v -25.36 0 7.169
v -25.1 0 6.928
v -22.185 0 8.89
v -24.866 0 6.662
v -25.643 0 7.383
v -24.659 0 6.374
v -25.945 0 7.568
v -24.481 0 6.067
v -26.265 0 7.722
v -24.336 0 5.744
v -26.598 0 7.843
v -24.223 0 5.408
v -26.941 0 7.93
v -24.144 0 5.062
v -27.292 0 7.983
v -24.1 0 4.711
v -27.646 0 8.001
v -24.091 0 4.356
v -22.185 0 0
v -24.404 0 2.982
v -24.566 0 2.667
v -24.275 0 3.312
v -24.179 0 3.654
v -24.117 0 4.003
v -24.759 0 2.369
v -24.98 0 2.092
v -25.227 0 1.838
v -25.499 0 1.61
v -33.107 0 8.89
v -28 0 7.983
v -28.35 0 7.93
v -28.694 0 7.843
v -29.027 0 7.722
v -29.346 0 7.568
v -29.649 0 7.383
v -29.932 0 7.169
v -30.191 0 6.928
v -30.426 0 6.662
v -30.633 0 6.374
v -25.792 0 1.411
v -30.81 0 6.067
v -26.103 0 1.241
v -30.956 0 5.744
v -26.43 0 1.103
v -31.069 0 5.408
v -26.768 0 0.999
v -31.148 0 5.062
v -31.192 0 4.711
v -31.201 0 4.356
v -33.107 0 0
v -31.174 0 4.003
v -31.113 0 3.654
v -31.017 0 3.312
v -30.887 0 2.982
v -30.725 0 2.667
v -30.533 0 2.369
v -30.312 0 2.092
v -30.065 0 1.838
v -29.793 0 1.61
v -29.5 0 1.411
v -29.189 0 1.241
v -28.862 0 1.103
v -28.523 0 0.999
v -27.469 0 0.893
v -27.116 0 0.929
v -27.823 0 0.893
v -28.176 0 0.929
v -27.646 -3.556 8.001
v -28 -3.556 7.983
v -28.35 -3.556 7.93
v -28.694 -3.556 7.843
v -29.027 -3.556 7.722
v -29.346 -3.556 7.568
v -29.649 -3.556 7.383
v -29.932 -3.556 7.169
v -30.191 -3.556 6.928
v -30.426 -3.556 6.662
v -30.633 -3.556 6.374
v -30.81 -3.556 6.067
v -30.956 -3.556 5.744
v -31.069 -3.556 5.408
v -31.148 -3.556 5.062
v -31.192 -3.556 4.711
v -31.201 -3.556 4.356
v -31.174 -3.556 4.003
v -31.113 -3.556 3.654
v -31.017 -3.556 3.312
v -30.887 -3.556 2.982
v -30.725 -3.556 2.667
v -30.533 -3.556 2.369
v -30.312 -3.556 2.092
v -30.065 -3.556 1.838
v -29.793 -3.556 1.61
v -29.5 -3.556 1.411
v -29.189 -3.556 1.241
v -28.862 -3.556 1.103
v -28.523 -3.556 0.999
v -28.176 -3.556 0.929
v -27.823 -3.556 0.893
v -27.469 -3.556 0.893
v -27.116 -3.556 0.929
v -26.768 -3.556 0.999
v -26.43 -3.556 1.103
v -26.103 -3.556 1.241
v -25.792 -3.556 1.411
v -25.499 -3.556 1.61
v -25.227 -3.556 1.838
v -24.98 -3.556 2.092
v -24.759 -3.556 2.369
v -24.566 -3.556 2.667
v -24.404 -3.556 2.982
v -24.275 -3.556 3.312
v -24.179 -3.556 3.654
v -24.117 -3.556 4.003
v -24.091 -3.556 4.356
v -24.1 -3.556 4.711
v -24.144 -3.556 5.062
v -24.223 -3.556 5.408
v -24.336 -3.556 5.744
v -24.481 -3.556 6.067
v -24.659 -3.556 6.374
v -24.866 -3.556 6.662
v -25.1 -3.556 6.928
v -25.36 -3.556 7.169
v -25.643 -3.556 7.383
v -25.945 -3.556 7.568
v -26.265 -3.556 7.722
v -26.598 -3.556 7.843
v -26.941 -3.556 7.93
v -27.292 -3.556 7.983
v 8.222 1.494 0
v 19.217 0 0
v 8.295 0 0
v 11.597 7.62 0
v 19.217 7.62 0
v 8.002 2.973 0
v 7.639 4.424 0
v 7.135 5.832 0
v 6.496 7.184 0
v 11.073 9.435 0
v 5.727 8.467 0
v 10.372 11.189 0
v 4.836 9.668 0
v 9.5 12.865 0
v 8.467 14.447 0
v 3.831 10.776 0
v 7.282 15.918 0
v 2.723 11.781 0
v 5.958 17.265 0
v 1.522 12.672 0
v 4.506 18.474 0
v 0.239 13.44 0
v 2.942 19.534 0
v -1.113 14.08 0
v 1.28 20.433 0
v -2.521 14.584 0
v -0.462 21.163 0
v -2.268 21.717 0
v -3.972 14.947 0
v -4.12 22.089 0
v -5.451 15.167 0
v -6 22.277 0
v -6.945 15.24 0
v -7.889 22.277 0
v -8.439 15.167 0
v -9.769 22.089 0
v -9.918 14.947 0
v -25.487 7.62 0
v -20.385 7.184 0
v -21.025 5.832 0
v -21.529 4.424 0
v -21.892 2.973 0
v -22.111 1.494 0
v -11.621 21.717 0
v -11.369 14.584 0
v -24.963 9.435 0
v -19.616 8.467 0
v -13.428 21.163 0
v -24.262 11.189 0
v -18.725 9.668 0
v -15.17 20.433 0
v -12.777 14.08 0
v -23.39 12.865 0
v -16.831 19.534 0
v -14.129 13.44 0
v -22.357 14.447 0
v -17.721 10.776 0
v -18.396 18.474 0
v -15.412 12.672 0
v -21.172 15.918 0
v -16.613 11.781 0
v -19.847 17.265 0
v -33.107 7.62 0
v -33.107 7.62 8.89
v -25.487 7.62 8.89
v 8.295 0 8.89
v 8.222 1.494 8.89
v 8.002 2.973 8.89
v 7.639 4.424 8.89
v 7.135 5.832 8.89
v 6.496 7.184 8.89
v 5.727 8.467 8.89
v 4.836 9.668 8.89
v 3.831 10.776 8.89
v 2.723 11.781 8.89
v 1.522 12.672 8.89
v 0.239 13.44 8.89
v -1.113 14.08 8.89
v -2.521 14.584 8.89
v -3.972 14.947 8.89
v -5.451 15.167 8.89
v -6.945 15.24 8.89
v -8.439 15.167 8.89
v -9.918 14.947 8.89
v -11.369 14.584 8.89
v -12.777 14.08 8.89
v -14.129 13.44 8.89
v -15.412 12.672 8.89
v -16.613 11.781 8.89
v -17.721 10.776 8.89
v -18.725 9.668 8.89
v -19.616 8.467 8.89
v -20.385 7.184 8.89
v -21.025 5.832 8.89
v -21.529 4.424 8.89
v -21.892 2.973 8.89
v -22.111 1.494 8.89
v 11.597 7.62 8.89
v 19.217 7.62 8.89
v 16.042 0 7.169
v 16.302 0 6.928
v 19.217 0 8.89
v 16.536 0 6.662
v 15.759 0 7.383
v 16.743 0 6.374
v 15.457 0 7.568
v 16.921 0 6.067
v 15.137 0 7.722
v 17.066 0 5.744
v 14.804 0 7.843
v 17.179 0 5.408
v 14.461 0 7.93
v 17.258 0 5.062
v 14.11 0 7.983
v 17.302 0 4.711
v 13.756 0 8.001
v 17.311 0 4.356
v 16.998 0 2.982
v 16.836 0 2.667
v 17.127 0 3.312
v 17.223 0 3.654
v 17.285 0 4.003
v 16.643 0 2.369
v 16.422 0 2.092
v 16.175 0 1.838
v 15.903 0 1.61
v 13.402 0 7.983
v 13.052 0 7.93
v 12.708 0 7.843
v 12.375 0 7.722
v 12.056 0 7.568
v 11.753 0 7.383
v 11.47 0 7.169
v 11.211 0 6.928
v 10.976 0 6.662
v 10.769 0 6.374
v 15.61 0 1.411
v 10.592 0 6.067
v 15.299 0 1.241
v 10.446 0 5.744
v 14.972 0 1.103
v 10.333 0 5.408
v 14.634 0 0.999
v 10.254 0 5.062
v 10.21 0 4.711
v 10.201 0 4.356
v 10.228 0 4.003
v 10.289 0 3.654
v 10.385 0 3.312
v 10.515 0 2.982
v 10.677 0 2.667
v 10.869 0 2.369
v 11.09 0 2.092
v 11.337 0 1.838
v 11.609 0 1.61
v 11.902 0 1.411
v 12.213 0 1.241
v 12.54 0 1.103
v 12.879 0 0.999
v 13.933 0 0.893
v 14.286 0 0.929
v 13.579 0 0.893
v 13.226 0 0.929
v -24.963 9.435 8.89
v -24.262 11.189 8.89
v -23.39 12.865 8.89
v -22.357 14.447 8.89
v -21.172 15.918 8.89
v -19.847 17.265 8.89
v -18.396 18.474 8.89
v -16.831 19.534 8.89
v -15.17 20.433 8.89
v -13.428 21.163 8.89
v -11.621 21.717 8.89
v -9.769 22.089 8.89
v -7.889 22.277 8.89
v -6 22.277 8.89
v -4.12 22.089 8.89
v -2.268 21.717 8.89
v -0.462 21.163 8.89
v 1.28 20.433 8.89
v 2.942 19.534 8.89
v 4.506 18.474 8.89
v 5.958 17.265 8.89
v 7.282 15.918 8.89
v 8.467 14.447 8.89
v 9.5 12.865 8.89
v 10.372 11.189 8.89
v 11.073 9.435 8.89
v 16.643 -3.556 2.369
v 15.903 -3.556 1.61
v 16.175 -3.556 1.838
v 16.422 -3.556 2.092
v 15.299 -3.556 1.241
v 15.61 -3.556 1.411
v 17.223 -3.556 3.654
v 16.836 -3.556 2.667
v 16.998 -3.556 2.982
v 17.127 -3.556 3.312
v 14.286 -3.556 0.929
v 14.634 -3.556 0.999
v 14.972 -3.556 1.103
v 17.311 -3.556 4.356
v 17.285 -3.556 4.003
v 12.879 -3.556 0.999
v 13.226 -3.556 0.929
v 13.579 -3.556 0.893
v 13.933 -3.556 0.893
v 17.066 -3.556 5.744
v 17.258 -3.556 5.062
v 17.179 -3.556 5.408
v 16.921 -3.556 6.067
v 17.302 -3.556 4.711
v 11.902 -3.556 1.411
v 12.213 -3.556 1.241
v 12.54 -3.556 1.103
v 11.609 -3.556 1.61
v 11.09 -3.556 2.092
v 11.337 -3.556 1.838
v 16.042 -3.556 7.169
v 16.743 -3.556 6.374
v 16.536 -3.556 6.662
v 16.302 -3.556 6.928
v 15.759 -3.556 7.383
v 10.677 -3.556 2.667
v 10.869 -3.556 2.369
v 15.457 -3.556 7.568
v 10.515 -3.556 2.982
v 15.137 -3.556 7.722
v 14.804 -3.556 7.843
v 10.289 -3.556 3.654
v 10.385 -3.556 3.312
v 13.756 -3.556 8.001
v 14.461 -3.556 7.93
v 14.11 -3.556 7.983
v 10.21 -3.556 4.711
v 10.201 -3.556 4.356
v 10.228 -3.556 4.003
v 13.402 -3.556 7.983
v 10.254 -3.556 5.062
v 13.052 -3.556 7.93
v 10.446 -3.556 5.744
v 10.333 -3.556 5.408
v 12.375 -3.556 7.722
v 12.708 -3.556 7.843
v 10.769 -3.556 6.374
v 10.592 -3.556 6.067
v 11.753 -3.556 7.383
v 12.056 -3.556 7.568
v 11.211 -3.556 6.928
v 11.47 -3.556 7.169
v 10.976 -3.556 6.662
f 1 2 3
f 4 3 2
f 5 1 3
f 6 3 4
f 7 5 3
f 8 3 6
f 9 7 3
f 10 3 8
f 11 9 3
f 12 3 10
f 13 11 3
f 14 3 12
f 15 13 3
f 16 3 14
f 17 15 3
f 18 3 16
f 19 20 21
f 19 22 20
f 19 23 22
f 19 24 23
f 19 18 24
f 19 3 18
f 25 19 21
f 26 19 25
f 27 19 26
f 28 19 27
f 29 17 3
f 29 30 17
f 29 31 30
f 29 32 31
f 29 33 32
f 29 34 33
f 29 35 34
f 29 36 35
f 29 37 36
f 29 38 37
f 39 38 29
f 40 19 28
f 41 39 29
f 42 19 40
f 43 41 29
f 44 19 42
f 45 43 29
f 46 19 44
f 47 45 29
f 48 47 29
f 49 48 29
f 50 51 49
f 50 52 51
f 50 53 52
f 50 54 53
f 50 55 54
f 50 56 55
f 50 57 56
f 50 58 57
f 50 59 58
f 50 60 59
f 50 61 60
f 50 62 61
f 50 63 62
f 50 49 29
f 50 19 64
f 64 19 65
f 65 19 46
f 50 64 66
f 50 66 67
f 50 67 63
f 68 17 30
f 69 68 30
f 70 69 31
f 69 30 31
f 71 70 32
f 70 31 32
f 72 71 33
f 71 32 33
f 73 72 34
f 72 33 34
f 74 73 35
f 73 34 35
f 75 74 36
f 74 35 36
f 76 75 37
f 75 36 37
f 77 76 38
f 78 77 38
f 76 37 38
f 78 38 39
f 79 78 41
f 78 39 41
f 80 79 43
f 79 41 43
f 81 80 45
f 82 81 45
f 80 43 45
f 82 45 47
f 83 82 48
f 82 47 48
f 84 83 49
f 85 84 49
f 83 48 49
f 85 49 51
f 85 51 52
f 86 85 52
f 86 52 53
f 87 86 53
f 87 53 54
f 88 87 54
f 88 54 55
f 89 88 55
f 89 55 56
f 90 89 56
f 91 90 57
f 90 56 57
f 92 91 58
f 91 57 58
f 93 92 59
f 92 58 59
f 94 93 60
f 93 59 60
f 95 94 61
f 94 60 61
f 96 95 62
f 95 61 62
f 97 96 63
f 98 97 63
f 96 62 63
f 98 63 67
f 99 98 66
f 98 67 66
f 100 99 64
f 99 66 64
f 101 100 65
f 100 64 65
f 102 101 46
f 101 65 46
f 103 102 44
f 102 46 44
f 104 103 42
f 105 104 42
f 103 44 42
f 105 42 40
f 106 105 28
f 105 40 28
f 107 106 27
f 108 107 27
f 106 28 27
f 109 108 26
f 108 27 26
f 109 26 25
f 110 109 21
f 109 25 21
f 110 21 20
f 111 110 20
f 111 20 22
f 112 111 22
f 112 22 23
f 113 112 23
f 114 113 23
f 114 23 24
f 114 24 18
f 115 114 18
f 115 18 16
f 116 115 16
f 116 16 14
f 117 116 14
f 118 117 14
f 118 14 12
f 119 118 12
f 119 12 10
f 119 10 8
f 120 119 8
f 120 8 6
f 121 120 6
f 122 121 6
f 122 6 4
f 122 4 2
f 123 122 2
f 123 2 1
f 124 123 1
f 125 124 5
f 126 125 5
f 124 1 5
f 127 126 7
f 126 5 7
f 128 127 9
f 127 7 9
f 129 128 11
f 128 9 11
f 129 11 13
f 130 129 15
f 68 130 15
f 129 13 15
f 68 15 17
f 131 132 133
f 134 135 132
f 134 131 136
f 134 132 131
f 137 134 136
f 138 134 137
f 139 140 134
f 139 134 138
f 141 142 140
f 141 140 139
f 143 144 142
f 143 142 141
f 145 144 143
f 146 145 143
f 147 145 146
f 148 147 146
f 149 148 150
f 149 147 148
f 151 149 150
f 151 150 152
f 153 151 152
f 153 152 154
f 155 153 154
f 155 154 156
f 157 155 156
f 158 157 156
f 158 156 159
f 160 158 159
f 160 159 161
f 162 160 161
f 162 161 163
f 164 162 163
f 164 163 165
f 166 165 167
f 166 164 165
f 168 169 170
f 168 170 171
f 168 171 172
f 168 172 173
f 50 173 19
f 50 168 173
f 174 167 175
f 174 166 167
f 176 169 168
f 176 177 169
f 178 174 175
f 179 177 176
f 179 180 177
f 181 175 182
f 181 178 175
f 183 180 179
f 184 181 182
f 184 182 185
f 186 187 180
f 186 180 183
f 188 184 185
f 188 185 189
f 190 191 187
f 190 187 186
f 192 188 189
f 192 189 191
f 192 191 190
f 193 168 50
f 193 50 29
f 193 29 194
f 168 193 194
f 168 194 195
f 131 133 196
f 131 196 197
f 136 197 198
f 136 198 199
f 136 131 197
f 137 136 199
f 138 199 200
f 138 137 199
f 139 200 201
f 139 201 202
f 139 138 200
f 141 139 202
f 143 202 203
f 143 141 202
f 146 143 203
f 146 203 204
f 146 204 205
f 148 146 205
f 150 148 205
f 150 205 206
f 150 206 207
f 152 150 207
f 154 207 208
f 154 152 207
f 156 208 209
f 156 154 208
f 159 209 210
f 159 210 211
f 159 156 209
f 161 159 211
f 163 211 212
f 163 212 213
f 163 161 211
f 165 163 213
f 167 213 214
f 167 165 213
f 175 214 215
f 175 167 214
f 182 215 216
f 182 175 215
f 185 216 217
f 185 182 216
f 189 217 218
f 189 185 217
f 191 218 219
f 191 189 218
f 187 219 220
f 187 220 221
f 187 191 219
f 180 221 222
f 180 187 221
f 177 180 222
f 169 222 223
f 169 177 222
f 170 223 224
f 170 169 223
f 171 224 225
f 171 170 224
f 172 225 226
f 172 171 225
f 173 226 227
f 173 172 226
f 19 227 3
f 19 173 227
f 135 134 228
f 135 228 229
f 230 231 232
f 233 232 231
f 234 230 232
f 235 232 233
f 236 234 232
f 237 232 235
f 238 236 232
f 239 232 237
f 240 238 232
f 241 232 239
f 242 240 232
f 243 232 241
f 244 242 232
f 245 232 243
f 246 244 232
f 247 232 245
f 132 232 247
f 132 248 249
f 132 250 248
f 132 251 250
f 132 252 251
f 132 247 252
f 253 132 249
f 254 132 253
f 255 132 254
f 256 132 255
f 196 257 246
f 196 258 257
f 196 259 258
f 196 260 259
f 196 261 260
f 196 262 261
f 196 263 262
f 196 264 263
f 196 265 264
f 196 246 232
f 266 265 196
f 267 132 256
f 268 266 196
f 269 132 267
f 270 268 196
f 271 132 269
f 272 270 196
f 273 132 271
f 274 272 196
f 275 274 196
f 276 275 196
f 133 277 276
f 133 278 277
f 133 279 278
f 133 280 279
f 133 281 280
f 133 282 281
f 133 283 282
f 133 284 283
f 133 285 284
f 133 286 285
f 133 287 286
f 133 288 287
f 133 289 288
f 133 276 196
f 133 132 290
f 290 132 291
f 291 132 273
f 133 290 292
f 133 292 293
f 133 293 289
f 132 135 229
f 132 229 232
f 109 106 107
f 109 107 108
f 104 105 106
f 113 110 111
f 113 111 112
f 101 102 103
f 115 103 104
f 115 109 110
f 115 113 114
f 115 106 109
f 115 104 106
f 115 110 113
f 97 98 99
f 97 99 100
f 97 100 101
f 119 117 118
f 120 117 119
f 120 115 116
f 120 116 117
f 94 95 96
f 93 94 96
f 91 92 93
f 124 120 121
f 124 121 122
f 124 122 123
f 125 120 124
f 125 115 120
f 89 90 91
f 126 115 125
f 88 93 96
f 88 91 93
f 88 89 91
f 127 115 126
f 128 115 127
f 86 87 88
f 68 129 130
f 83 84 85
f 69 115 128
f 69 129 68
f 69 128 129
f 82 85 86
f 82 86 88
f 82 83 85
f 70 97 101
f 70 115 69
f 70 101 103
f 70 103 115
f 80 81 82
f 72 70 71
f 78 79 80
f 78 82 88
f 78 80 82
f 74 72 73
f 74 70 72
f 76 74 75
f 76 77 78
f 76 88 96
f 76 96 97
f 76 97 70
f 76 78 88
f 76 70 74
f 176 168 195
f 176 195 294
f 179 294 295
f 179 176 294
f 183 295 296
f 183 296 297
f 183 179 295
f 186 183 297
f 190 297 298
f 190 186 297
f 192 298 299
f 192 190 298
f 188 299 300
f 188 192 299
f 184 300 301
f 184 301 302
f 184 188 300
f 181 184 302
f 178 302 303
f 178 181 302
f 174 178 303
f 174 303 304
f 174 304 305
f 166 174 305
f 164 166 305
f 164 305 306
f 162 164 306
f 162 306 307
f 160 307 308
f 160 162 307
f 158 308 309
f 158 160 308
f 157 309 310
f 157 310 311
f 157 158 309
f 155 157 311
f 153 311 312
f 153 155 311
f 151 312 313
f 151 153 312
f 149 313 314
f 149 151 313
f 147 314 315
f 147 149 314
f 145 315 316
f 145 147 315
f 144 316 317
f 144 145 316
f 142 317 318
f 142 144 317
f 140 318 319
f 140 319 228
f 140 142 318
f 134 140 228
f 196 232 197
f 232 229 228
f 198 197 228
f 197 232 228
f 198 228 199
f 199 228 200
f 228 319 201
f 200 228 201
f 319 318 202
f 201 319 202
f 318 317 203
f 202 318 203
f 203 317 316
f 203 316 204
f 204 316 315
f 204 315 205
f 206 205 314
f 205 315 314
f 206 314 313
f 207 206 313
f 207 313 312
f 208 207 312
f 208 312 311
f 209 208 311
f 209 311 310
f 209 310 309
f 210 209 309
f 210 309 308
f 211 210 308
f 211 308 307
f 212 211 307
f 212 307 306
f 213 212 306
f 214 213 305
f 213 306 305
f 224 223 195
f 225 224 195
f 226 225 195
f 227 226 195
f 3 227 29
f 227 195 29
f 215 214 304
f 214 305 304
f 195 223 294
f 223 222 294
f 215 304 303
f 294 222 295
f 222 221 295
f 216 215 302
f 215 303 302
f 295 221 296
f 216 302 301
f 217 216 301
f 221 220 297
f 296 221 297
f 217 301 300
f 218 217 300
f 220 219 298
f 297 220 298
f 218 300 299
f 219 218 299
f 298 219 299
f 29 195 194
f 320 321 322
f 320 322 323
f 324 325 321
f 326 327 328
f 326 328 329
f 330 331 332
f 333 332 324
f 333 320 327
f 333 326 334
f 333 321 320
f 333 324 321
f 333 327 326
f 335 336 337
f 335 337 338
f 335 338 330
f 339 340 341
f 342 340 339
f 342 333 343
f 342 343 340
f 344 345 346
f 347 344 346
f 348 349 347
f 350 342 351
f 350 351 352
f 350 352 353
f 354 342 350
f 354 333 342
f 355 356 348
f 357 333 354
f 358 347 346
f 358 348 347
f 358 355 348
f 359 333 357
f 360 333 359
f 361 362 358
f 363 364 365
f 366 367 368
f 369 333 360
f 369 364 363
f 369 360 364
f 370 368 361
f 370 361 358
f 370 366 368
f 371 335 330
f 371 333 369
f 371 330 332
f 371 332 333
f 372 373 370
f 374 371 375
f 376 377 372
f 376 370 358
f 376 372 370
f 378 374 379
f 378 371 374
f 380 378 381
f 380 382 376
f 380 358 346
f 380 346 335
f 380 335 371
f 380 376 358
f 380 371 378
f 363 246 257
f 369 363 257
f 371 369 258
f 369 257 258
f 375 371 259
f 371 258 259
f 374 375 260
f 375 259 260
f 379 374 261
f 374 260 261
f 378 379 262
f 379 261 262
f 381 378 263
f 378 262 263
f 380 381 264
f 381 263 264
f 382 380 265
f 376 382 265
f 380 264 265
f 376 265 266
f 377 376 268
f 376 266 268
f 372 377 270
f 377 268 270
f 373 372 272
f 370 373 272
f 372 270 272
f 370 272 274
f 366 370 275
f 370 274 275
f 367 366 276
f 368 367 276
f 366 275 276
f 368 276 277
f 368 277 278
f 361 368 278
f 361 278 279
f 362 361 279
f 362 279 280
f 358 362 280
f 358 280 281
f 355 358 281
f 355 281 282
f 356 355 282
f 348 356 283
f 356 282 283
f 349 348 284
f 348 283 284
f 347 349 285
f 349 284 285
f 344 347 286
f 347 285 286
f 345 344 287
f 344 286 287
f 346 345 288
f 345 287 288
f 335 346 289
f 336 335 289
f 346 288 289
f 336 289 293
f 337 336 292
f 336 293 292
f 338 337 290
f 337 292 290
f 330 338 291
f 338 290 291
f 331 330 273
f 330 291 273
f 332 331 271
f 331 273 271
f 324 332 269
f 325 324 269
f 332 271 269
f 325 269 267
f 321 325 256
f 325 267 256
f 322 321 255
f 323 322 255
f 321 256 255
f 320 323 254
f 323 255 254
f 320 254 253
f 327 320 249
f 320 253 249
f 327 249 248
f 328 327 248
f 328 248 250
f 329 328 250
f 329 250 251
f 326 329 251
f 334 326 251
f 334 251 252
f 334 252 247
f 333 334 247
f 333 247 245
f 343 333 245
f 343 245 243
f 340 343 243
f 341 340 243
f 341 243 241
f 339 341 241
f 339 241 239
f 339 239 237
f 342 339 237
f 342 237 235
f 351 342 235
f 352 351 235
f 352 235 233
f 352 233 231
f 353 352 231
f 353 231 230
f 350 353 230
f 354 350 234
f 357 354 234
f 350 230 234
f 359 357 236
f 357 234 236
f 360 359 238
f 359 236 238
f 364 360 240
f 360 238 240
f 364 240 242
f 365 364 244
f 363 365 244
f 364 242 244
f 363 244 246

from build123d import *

# Parameters (mm, degrees)
BOSS_EXTRUDE1_DEPTH = 8.89
SKETCH3_R           = 3.556
BOSS_EXTRUDE2_DEPTH = 3.556


with BuildPart() as part:
    # Sketch2 → Boss-Extrude1 (new body)
    with BuildSketch(Plane.XY):
        with BuildLine():
            Line((-22.184810127, 0), (-33.106810127, 0))
            Line((-33.106810127, 0), (-33.106810127, 7.62))
            Line((-33.106810127, 7.62), (-25.486810127, 7.62))
            ThreePointArc((-25.486810127, 7.62), (-6.944810127, 22.300018764), (11.597189873, 7.62))
            Line((11.597189873, 7.62), (19.217189873, 7.62))
            Line((19.217189873, 7.62), (19.217189873, 0))
            Line((19.217189873, 0), (8.295189873, 0))
            ThreePointArc((8.295189873, 0), (-6.944810127, 15.24), (-22.184810127, 0))
        make_face()
    extrude(amount=BOSS_EXTRUDE1_DEPTH)

    # Sketch3 → Boss-Extrude2 (add)
    with BuildSketch(Plane.XZ):
        with Locations(Location((-27.645810127, 4.445, 0), (0, 0, 90))):
            Circle(SKETCH3_R)
        with Locations(Location((13.756189873, 4.445, 0), (0, 0, 90))):
            Circle(SKETCH3_R)
    extrude(amount=BOSS_EXTRUDE2_DEPTH)


solid = part.part
